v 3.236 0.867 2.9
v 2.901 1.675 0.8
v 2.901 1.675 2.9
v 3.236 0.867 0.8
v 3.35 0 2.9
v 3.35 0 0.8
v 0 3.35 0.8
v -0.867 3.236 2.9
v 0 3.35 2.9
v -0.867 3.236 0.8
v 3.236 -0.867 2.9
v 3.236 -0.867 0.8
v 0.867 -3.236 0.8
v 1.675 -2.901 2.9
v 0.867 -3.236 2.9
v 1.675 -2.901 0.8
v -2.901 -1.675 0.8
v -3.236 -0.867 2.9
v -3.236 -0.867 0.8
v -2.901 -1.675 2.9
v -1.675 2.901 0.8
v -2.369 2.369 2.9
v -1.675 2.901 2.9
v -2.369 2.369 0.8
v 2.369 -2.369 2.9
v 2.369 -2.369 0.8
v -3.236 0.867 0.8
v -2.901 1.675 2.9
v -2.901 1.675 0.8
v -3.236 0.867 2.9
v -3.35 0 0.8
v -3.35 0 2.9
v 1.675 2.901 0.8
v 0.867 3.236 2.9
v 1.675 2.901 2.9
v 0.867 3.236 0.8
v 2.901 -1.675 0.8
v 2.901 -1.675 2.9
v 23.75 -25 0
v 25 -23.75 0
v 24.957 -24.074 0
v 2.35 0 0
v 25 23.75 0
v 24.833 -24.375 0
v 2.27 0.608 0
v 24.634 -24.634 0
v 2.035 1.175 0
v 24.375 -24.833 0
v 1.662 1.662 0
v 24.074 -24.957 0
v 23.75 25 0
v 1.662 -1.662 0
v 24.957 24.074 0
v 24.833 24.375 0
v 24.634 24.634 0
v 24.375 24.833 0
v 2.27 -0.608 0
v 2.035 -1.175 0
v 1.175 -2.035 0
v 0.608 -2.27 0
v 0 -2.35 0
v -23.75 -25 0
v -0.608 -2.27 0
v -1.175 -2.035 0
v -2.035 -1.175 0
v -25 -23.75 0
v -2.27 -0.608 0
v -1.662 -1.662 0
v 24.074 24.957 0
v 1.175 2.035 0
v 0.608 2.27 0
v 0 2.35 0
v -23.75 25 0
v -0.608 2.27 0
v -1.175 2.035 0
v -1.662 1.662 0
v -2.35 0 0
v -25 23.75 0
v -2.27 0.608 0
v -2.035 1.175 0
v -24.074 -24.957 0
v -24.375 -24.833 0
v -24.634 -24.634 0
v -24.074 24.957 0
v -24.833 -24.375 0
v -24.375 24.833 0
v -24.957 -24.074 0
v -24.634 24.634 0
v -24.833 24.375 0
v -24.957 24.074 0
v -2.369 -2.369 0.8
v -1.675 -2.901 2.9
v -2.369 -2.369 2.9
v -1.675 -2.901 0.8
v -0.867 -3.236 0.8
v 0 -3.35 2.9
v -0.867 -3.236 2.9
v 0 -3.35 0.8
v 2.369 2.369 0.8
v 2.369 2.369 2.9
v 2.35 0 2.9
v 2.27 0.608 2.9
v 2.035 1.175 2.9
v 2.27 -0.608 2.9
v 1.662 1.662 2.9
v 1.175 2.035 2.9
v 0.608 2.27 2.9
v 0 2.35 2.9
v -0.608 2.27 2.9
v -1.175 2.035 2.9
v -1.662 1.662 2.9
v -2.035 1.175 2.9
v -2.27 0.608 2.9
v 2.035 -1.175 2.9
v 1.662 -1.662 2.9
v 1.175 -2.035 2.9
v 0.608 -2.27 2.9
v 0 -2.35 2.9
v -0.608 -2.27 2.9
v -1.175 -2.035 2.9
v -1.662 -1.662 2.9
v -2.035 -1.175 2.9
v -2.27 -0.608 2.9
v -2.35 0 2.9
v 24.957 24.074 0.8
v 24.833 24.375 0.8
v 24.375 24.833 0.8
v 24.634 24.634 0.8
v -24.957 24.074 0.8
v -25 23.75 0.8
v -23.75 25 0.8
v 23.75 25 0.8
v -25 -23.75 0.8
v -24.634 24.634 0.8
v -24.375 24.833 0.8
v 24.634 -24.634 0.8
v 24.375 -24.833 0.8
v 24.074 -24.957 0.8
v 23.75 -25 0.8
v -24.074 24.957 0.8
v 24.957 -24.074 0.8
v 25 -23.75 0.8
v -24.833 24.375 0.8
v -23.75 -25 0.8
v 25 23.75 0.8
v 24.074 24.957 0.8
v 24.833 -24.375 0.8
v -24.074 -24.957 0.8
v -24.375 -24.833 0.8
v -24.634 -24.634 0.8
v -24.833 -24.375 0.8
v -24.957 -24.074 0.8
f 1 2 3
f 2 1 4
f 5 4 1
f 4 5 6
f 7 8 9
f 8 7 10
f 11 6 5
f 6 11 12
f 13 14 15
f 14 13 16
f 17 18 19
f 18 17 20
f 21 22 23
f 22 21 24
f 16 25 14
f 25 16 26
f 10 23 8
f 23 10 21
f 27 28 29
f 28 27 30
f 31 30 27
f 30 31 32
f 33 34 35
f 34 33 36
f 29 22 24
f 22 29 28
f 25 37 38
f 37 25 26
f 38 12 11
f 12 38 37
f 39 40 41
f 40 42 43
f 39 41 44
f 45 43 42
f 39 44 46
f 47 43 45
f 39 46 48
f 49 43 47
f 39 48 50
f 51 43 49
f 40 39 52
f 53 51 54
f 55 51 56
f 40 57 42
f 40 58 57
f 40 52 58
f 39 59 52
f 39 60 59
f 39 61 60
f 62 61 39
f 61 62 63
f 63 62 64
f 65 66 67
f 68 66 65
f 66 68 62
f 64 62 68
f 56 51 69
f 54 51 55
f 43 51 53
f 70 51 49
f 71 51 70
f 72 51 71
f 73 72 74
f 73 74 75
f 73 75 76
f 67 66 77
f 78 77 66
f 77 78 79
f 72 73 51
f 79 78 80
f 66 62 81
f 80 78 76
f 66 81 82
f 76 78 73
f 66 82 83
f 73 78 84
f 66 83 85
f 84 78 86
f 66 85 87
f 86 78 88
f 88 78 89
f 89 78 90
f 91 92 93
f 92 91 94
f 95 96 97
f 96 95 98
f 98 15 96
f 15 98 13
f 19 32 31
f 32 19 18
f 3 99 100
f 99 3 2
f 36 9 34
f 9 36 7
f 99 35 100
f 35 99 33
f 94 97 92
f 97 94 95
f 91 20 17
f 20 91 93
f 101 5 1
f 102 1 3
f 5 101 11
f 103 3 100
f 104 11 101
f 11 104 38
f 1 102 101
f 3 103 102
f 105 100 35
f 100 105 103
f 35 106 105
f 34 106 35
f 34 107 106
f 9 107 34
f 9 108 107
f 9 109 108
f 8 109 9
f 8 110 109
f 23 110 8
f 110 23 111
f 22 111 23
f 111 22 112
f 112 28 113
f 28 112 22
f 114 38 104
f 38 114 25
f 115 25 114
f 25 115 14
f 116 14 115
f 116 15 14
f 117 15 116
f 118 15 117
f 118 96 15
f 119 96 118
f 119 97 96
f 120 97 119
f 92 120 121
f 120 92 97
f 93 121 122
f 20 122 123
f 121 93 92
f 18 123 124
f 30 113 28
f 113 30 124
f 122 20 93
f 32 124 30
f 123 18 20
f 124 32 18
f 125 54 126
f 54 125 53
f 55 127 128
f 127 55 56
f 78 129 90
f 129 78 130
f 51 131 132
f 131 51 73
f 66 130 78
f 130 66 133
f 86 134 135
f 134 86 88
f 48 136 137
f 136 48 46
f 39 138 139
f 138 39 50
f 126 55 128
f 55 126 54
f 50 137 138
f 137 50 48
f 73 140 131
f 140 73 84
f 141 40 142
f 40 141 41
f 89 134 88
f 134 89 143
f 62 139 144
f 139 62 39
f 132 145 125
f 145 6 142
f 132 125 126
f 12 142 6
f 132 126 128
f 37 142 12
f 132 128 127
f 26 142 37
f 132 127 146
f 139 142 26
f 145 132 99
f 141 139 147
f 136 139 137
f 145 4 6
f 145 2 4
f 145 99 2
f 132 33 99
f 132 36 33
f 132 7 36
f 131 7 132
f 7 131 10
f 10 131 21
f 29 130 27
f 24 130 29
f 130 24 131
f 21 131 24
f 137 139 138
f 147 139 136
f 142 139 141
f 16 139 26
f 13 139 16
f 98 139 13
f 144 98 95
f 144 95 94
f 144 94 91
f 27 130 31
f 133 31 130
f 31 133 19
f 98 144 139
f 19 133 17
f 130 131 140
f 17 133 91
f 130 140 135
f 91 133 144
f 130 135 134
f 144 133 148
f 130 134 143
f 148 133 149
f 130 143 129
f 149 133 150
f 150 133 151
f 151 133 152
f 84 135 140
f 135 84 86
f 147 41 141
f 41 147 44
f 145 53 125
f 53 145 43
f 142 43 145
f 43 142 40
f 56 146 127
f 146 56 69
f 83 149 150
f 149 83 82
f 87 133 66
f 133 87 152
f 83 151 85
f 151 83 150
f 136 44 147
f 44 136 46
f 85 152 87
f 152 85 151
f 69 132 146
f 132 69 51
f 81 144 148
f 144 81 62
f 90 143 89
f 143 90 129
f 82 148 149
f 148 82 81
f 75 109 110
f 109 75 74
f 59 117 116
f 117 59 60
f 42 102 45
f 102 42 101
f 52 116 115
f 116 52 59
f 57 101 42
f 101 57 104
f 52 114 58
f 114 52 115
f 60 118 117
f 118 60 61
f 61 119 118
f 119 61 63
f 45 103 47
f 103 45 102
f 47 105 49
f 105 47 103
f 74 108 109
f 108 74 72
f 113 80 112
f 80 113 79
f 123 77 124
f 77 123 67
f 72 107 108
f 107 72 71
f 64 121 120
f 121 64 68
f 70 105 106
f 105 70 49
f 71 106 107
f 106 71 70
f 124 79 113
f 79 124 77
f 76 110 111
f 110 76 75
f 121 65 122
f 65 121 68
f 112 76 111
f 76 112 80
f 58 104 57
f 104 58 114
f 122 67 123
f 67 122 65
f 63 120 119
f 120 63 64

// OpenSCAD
// Prusa lack shim + standoff
//


/* Global */
// Print a standoff
use_standoff = 1; // [1:True, 0:False]

// Customizer doesn't like boolean
// you can set it here if you use OpenSCAD
standoff = ( use_standoff == 1) ? true: false ;
//standoff = false; 

// Shim thickness in mm
shim_thickness = 0.8 ; 

// screw diameter used
screw_hole = 5.0 ;

// fudge
// corner radius
corner_cylinder_r = 2.5;  
// part clearance (you probably don't want to change this)
clearance = 0.3; 

// from the part 

// Space between the surface where the screw head rests and outside of the part (you probably don't want to change this)
depth_of_bottom = 2.9 ; // 
// Size of the screw hole (you probably don't want to change this)
part_screw_hole = 7 ; //
// Length and width of the part (you probably don't want to change this)
part_width = 50 ; // 

// calculate (once?)
shim_trans = (part_width/2 - corner_cylinder_r/2) ;

/* [Hidden] */
// ignore variable values
$fn=24;

// the parts

difference()
{
    union()
    {
            
        // screw standoff
        if ( standoff == true )
        {
            cylinder( h=  depth_of_bottom, d = part_screw_hole - clearance );
        }
        // shim
        hull()
        {
            translate([ shim_trans, shim_trans ,0 ])
            cylinder( h= shim_thickness , d = corner_cylinder_r );
            translate([ -shim_trans, shim_trans ,0 ])
            cylinder( h= shim_thickness , d = corner_cylinder_r );
            translate([ shim_trans, -shim_trans ,0 ])
            cylinder( h= shim_thickness , d = corner_cylinder_r );
            translate([ -shim_trans, -shim_trans ,0 ])
            cylinder( h= shim_thickness , d = corner_cylinder_r );
            
        }
    }
    
    // hole for screw
    hole_size = standoff ? screw_hole - clearance : part_screw_hole ;
    translate([0,0, - clearance/2])
    cylinder( h=  depth_of_bottom + clearance, d = screw_hole - clearance );

}
    
